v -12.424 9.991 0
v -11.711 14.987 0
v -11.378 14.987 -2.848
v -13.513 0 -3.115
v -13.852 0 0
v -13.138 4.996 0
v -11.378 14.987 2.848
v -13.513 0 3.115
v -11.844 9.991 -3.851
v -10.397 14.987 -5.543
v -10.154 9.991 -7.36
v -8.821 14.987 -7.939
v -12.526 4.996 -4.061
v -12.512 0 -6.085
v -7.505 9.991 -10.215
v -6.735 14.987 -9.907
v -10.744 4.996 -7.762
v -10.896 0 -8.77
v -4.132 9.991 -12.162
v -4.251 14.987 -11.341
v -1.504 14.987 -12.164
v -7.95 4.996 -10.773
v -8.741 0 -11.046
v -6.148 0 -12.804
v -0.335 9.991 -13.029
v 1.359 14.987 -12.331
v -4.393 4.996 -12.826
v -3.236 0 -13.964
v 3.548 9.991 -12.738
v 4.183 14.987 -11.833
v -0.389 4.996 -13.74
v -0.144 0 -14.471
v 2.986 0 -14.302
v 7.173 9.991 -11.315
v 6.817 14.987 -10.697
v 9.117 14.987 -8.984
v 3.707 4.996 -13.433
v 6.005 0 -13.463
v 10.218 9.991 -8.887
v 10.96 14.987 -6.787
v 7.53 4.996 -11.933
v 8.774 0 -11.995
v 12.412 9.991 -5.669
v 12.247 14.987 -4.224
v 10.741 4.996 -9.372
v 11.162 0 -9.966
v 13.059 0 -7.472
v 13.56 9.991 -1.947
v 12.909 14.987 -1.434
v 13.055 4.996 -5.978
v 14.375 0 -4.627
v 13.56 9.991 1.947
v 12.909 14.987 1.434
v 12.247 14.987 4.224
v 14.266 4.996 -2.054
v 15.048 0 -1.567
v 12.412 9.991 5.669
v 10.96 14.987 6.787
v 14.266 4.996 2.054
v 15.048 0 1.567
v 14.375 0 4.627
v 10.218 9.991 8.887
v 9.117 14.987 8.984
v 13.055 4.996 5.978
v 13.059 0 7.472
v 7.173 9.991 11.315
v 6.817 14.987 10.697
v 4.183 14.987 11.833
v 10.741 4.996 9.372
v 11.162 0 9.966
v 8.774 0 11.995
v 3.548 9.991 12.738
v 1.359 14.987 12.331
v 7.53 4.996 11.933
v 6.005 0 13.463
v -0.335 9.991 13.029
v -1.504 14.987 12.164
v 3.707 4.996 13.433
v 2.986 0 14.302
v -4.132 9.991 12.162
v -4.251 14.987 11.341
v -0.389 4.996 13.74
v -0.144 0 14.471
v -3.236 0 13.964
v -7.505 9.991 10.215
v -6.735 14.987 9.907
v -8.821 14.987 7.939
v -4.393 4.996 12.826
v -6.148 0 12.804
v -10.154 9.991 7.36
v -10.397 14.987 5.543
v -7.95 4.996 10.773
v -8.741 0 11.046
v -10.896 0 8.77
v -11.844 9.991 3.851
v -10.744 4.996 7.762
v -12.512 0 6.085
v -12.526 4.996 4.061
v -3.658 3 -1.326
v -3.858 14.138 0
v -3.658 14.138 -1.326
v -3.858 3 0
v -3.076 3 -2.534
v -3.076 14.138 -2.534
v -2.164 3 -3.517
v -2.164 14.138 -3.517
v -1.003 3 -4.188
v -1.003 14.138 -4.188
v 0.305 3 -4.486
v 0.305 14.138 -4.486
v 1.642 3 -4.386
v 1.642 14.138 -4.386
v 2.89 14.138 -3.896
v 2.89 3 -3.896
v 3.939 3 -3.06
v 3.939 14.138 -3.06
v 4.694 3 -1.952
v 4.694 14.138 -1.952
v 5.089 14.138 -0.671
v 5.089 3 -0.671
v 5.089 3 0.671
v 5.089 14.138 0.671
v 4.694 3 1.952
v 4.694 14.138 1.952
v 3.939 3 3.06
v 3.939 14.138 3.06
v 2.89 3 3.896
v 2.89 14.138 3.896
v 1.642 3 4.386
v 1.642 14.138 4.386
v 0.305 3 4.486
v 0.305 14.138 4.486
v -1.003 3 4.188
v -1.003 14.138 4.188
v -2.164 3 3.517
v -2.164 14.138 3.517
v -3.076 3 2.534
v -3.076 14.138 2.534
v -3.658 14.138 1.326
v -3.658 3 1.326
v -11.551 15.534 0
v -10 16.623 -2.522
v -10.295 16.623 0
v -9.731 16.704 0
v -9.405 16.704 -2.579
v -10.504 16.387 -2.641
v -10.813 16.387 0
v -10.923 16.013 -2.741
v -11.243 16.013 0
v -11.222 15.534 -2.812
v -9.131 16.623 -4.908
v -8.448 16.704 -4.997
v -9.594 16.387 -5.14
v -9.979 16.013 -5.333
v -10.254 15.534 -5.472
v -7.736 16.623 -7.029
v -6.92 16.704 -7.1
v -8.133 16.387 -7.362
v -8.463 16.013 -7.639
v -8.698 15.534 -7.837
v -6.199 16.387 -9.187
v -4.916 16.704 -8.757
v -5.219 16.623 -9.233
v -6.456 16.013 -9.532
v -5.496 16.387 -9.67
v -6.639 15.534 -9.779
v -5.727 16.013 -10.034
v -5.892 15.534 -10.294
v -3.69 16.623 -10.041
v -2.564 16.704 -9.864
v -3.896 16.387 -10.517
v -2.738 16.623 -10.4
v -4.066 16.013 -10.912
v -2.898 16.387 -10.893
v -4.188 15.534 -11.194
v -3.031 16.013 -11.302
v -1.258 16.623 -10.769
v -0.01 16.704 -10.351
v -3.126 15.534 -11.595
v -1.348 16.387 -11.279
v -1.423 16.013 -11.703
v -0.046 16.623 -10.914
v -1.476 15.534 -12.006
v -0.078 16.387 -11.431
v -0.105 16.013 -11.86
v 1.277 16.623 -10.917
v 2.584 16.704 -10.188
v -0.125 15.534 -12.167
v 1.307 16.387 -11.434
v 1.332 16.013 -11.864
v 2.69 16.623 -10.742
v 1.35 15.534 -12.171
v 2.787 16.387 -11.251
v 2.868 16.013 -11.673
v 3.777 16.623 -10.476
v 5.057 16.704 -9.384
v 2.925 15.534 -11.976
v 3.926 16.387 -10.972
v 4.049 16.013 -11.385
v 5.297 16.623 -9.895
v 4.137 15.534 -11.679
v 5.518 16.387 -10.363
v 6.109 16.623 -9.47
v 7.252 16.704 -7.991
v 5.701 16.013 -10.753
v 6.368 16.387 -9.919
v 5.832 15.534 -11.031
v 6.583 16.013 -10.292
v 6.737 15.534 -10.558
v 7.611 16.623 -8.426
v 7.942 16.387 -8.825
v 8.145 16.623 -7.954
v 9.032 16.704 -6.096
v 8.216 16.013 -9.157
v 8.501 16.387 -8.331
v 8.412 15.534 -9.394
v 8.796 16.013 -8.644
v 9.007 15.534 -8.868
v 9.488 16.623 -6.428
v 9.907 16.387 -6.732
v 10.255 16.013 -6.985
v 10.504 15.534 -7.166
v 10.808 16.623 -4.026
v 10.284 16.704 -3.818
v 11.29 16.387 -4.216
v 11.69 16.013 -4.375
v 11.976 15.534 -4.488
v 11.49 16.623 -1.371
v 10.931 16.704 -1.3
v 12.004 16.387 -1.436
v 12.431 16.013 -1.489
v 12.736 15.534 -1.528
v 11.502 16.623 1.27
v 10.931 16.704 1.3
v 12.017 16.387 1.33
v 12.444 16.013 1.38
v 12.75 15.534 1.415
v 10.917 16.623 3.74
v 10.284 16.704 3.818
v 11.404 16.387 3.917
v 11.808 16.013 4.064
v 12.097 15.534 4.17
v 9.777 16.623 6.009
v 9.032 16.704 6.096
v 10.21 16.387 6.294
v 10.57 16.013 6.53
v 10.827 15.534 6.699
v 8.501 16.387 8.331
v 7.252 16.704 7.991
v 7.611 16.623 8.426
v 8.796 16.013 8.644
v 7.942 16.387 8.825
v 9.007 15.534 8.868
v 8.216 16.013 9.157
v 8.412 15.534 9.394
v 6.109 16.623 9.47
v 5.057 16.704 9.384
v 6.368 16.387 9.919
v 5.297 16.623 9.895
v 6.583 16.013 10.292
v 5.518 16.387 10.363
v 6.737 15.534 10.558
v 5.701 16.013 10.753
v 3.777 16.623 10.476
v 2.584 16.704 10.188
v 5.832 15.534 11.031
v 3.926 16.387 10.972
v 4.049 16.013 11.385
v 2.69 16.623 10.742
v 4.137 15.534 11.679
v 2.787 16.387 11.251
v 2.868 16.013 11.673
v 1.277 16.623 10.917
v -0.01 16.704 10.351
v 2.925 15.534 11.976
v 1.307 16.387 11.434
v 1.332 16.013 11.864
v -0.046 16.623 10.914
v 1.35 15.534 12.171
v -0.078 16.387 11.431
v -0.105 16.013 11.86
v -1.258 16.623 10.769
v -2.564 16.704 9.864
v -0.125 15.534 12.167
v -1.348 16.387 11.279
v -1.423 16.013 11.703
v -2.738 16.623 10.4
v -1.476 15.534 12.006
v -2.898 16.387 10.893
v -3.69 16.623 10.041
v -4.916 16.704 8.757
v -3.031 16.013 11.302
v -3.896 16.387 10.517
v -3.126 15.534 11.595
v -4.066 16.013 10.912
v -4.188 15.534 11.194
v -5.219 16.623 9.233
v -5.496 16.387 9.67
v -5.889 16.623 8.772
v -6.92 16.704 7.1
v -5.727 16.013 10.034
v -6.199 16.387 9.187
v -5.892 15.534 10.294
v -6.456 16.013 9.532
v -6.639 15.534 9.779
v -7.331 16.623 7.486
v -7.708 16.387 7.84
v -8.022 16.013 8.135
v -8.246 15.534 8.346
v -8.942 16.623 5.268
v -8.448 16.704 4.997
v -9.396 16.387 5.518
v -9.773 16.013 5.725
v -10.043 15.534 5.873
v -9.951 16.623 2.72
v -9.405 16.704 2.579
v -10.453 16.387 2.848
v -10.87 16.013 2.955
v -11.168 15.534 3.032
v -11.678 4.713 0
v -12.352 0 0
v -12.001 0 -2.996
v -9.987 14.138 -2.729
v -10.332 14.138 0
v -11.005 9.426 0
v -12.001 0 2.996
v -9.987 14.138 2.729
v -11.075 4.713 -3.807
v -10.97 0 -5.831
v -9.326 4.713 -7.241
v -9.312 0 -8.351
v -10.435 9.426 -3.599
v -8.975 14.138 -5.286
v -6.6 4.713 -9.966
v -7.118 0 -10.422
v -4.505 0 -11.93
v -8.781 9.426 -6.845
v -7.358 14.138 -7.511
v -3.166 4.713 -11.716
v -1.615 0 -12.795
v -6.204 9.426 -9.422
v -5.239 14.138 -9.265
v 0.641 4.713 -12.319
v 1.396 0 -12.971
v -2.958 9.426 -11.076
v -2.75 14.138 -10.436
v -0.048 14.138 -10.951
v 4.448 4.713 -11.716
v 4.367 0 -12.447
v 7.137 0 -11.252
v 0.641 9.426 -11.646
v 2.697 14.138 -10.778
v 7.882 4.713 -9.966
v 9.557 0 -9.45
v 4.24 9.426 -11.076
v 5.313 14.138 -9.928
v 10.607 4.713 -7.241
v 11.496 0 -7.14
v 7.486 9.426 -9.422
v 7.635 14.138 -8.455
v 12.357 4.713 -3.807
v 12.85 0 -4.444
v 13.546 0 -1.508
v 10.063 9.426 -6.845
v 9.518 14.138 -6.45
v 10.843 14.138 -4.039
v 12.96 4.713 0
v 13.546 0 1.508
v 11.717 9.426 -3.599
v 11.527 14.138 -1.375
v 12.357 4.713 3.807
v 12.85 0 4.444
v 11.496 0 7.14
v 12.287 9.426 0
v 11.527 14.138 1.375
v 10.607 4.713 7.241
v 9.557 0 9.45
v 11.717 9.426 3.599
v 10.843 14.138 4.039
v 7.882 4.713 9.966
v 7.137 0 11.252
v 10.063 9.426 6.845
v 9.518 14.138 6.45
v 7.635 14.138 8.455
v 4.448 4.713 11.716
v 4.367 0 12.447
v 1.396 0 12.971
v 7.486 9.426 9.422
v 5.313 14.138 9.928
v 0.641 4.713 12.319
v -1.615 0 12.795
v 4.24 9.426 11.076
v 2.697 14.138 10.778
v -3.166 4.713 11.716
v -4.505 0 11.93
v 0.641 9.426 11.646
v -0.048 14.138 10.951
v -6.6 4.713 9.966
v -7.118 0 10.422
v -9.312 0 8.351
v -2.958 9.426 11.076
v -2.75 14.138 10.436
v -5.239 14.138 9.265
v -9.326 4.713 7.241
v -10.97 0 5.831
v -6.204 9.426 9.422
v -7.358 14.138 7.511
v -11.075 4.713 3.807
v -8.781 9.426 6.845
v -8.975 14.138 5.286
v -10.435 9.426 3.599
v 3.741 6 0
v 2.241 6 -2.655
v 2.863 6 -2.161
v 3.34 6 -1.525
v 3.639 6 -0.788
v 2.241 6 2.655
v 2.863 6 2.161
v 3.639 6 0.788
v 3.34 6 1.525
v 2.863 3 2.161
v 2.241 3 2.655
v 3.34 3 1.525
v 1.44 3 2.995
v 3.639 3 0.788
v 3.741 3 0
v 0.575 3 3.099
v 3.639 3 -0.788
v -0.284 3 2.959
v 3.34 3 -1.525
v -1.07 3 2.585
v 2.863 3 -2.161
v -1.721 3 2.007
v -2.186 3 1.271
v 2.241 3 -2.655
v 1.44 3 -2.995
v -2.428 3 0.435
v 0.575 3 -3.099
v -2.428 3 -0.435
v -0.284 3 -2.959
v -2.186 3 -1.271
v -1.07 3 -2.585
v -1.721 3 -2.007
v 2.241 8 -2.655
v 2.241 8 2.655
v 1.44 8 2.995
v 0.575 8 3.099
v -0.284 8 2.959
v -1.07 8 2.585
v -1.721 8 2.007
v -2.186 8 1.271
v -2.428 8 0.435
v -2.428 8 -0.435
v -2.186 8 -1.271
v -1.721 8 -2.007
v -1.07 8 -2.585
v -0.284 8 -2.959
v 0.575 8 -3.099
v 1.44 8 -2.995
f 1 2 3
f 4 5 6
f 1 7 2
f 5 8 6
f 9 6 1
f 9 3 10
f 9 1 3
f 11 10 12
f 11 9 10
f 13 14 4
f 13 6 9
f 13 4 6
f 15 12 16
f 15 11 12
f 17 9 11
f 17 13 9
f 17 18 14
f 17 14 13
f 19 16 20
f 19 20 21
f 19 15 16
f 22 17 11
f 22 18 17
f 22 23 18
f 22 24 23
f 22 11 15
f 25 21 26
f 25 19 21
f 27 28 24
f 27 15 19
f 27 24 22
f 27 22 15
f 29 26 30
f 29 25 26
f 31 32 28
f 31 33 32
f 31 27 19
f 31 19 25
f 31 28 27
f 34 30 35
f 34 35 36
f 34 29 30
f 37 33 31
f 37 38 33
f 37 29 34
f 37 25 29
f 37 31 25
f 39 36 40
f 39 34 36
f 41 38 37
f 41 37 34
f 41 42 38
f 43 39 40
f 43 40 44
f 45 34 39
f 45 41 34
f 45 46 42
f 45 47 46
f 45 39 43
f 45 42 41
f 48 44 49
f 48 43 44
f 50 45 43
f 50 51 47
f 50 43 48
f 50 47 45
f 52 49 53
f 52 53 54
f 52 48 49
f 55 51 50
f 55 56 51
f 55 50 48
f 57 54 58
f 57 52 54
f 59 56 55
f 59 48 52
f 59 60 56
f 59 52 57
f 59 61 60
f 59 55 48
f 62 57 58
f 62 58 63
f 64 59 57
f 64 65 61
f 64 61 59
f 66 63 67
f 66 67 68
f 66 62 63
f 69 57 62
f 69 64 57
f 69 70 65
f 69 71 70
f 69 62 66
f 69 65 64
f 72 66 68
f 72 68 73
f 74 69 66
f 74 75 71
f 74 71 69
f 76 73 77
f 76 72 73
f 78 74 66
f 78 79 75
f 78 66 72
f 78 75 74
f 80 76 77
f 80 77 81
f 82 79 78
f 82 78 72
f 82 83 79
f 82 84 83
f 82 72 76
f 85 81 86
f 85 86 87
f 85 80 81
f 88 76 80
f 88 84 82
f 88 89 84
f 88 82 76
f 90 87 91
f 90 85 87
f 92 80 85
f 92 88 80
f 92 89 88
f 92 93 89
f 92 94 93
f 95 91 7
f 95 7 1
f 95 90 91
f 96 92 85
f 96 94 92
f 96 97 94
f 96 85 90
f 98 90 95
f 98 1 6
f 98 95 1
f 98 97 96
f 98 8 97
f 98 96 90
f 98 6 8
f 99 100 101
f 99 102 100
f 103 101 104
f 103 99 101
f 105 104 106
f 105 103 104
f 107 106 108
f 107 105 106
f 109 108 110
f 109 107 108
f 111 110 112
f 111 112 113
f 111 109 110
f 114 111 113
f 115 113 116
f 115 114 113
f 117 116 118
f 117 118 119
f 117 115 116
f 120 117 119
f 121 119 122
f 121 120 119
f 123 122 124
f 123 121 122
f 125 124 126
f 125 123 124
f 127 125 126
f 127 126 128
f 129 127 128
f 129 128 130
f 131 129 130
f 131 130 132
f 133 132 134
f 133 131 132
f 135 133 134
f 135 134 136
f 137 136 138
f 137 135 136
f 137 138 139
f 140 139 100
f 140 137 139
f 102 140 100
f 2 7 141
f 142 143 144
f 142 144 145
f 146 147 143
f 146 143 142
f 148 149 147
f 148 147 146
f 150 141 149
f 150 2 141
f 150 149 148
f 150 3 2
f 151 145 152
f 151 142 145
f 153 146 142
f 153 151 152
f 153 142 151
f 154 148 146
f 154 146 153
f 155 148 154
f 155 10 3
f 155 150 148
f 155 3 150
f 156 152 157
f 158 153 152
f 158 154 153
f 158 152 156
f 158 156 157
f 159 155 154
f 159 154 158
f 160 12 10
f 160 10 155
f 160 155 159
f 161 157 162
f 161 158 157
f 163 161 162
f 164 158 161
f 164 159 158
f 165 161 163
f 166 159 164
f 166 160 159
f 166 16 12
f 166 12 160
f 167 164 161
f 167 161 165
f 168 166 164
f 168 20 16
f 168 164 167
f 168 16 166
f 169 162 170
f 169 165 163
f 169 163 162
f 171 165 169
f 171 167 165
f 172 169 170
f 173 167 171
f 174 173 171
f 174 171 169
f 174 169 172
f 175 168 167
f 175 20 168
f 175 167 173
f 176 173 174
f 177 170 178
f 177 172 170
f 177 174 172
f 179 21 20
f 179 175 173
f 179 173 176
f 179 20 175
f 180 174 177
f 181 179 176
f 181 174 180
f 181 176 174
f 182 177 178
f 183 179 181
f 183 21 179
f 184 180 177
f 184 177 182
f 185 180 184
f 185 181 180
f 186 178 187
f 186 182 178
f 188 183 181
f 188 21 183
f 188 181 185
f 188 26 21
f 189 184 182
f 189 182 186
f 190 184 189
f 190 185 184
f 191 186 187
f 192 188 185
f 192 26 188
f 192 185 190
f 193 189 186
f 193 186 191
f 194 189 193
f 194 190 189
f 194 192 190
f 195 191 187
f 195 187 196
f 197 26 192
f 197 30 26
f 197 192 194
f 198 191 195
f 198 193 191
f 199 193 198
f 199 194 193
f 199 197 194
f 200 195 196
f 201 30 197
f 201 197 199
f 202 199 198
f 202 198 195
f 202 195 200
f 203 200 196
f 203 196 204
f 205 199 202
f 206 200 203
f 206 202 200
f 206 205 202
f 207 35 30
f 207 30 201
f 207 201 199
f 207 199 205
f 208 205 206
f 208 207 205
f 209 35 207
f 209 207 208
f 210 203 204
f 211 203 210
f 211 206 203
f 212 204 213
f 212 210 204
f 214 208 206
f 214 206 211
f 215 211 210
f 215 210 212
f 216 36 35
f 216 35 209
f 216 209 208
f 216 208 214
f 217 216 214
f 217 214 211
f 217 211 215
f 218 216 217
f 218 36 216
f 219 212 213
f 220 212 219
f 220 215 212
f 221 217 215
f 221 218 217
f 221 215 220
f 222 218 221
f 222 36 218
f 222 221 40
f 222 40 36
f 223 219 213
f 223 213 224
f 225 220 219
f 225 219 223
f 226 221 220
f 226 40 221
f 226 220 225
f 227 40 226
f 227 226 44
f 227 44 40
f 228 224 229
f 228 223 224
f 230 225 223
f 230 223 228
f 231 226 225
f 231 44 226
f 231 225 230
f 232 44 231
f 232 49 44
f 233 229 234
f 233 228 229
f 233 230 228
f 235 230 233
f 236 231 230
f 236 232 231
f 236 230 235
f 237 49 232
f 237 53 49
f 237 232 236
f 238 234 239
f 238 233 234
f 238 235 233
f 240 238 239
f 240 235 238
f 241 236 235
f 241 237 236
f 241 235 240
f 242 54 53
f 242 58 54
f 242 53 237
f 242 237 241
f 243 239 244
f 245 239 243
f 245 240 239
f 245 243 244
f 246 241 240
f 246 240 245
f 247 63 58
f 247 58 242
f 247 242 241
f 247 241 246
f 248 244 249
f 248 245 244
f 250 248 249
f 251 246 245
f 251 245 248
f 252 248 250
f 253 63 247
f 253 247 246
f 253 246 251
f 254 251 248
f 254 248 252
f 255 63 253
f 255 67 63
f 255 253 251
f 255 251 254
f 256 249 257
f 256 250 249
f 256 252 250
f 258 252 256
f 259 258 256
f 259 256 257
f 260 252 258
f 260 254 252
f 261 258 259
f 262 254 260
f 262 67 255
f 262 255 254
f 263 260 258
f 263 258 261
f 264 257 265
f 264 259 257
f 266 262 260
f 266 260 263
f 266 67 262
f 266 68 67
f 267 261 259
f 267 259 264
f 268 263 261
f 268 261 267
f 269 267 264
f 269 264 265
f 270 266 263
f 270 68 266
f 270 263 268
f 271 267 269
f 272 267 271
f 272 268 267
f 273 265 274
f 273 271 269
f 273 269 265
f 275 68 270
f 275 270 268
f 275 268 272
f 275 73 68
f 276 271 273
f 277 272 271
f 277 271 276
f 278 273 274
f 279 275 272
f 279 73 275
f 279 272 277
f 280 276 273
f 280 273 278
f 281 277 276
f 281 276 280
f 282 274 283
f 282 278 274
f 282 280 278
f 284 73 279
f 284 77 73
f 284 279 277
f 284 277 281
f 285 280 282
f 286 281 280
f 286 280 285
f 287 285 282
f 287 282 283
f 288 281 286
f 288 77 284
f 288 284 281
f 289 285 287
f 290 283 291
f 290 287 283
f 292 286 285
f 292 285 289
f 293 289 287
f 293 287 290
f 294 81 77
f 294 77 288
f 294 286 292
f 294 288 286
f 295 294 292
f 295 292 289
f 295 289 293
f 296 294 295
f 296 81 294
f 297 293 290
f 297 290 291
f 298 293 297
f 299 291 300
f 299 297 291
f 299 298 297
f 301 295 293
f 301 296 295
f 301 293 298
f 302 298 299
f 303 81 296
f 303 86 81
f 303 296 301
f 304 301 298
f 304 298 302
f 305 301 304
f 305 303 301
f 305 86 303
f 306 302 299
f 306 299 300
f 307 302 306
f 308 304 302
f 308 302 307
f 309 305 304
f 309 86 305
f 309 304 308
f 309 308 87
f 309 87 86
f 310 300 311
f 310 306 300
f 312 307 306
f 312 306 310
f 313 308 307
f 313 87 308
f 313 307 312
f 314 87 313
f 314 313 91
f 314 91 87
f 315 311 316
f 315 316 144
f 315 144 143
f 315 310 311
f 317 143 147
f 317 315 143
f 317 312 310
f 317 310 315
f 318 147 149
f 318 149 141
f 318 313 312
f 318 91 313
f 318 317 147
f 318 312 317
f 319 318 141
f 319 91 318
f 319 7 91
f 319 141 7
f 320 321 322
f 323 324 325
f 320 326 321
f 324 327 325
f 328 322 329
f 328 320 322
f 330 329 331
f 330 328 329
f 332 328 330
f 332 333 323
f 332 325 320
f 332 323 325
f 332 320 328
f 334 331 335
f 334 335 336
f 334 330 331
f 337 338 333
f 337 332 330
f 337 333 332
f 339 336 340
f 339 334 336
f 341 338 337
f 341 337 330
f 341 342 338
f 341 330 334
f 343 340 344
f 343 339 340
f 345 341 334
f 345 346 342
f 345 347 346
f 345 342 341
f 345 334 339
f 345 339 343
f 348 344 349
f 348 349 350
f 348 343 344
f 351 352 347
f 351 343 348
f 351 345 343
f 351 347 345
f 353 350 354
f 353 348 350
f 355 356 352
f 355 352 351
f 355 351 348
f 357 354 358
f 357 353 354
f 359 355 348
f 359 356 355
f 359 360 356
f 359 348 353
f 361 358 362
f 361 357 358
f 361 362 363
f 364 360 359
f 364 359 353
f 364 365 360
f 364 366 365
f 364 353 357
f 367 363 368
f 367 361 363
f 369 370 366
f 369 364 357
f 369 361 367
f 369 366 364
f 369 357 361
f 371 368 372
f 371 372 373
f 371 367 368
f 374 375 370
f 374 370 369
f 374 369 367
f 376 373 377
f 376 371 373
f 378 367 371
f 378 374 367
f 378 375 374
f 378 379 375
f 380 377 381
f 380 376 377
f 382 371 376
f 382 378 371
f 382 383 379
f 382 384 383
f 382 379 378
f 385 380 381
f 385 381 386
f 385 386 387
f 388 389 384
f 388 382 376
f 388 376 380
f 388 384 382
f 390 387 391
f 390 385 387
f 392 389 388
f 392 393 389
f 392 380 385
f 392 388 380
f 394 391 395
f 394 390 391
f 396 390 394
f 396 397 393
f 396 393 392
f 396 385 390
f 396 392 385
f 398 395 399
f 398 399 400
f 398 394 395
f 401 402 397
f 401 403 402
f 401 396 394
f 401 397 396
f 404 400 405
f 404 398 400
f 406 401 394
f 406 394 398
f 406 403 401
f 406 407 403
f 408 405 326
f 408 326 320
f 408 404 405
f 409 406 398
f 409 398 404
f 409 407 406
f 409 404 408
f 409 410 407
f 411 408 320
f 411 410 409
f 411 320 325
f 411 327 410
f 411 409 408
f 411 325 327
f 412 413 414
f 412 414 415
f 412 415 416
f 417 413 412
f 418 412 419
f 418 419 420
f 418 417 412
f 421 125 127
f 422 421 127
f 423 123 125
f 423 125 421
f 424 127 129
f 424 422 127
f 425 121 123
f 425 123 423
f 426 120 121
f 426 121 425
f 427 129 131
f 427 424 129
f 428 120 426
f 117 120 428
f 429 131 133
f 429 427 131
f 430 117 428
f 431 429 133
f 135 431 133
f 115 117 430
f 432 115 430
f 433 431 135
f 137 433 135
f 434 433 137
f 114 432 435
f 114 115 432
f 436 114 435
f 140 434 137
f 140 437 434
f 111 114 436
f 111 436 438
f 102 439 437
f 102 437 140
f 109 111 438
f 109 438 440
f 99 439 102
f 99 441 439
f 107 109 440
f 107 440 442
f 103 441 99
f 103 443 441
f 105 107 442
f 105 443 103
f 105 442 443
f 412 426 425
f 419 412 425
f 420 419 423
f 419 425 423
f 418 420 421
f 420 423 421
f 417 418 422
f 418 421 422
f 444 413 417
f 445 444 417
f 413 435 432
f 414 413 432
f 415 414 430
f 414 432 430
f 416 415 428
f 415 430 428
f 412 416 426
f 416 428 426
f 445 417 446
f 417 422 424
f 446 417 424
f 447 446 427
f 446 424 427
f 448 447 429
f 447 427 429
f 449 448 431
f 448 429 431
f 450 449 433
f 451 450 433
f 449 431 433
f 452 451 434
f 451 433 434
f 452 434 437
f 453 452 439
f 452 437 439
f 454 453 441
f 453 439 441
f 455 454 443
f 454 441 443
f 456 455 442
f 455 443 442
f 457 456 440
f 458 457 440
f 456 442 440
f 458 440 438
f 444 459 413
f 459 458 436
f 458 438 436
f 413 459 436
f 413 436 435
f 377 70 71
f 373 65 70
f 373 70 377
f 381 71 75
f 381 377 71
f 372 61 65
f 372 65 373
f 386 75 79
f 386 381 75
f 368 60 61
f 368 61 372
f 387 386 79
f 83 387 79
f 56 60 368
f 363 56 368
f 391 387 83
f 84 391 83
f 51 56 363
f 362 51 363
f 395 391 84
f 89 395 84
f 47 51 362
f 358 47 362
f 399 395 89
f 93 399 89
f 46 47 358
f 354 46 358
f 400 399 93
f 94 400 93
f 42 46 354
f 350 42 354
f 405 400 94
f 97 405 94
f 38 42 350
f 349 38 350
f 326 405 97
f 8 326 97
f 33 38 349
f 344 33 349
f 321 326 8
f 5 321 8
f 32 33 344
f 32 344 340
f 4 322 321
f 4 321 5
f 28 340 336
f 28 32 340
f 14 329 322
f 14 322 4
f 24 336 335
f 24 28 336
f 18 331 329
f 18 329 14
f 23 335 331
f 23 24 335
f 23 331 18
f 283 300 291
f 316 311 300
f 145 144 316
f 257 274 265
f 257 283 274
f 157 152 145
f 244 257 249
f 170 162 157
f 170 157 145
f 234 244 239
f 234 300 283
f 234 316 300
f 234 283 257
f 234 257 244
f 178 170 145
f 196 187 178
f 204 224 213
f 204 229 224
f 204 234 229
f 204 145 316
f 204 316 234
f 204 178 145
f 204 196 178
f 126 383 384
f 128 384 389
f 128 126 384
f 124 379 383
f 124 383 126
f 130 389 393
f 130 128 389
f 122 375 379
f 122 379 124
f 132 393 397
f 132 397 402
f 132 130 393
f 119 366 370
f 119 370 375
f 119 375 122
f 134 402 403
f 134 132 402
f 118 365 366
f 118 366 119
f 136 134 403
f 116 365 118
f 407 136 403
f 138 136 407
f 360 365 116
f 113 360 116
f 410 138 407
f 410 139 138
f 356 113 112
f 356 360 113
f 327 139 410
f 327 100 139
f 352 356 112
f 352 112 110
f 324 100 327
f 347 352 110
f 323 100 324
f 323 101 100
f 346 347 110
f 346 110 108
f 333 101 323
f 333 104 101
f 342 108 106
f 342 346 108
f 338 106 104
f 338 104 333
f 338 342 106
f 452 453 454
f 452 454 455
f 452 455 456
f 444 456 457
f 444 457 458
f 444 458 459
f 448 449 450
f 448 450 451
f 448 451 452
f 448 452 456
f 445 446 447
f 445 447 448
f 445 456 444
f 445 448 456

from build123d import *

# Parameters (mm, degrees)
F2_R     = 2
F4_DEPTH = 3
F5_DEPTH = 5


with BuildPart() as f1:
    # F0 (on Top) → F1 (revolve)
    with BuildSketch(Plane.XY):
        Polygon((0.6408938694, 3), (0.6408938694, 16.7043862722), (-11.46528483, 16.7043862722), (-13.8516243371, 0), (-12.3516243371, 0), (-10.3318675491, 14.1383057447), (-3.8579331173, 14.1383057447), (-3.8579331173, 3), align=None)
    revolve(axis=Axis((0.6408938694, 3.1900271702, 0), (0, -1, 0)))

    # F2
    f2_edges = [f1.edges().sort_by_distance(p)[0] for p in [
        (12.747073, 16.704386, 0),
    ]]
    fillet(f2_edges, radius=F2_R)

    # F3 (on face) → F4 (cut)
    with BuildSketch(Plane.XZ.offset(-3)):
        with BuildLine():
            ThreePointArc((2.2408938694, -2.6551836095), (3.3399677847, -1.5247950682), (3.7408938694, 0))
            ThreePointArc((3.7408938694, 0), (3.3399677847, 1.5247950682), (2.2408938694, 2.6551836095))
            Line((2.2408938694, 2.6551836095), (2.2408938694, -2.6551836095))
        make_face()
        with BuildLine():
            Line((2.2408938694, -2.6551836095), (2.2408938694, 2.6551836095))
            ThreePointArc((2.2408938694, 2.6551836095), (-2.4591061306, 0), (2.2408938694, -2.6551836095))
        make_face()
    extrude(amount=-F4_DEPTH, mode=Mode.SUBTRACT)

    # F3 (on face) → F5 (cut)
    with BuildSketch(Plane.XZ.offset(-3)):
        with BuildLine():
            Line((2.2408938694, -2.6551836095), (2.2408938694, 2.6551836095))
            ThreePointArc((2.2408938694, 2.6551836095), (-2.4591061306, 0), (2.2408938694, -2.6551836095))
        make_face()
    extrude(amount=-F5_DEPTH, mode=Mode.SUBTRACT)


solid = f1.part
